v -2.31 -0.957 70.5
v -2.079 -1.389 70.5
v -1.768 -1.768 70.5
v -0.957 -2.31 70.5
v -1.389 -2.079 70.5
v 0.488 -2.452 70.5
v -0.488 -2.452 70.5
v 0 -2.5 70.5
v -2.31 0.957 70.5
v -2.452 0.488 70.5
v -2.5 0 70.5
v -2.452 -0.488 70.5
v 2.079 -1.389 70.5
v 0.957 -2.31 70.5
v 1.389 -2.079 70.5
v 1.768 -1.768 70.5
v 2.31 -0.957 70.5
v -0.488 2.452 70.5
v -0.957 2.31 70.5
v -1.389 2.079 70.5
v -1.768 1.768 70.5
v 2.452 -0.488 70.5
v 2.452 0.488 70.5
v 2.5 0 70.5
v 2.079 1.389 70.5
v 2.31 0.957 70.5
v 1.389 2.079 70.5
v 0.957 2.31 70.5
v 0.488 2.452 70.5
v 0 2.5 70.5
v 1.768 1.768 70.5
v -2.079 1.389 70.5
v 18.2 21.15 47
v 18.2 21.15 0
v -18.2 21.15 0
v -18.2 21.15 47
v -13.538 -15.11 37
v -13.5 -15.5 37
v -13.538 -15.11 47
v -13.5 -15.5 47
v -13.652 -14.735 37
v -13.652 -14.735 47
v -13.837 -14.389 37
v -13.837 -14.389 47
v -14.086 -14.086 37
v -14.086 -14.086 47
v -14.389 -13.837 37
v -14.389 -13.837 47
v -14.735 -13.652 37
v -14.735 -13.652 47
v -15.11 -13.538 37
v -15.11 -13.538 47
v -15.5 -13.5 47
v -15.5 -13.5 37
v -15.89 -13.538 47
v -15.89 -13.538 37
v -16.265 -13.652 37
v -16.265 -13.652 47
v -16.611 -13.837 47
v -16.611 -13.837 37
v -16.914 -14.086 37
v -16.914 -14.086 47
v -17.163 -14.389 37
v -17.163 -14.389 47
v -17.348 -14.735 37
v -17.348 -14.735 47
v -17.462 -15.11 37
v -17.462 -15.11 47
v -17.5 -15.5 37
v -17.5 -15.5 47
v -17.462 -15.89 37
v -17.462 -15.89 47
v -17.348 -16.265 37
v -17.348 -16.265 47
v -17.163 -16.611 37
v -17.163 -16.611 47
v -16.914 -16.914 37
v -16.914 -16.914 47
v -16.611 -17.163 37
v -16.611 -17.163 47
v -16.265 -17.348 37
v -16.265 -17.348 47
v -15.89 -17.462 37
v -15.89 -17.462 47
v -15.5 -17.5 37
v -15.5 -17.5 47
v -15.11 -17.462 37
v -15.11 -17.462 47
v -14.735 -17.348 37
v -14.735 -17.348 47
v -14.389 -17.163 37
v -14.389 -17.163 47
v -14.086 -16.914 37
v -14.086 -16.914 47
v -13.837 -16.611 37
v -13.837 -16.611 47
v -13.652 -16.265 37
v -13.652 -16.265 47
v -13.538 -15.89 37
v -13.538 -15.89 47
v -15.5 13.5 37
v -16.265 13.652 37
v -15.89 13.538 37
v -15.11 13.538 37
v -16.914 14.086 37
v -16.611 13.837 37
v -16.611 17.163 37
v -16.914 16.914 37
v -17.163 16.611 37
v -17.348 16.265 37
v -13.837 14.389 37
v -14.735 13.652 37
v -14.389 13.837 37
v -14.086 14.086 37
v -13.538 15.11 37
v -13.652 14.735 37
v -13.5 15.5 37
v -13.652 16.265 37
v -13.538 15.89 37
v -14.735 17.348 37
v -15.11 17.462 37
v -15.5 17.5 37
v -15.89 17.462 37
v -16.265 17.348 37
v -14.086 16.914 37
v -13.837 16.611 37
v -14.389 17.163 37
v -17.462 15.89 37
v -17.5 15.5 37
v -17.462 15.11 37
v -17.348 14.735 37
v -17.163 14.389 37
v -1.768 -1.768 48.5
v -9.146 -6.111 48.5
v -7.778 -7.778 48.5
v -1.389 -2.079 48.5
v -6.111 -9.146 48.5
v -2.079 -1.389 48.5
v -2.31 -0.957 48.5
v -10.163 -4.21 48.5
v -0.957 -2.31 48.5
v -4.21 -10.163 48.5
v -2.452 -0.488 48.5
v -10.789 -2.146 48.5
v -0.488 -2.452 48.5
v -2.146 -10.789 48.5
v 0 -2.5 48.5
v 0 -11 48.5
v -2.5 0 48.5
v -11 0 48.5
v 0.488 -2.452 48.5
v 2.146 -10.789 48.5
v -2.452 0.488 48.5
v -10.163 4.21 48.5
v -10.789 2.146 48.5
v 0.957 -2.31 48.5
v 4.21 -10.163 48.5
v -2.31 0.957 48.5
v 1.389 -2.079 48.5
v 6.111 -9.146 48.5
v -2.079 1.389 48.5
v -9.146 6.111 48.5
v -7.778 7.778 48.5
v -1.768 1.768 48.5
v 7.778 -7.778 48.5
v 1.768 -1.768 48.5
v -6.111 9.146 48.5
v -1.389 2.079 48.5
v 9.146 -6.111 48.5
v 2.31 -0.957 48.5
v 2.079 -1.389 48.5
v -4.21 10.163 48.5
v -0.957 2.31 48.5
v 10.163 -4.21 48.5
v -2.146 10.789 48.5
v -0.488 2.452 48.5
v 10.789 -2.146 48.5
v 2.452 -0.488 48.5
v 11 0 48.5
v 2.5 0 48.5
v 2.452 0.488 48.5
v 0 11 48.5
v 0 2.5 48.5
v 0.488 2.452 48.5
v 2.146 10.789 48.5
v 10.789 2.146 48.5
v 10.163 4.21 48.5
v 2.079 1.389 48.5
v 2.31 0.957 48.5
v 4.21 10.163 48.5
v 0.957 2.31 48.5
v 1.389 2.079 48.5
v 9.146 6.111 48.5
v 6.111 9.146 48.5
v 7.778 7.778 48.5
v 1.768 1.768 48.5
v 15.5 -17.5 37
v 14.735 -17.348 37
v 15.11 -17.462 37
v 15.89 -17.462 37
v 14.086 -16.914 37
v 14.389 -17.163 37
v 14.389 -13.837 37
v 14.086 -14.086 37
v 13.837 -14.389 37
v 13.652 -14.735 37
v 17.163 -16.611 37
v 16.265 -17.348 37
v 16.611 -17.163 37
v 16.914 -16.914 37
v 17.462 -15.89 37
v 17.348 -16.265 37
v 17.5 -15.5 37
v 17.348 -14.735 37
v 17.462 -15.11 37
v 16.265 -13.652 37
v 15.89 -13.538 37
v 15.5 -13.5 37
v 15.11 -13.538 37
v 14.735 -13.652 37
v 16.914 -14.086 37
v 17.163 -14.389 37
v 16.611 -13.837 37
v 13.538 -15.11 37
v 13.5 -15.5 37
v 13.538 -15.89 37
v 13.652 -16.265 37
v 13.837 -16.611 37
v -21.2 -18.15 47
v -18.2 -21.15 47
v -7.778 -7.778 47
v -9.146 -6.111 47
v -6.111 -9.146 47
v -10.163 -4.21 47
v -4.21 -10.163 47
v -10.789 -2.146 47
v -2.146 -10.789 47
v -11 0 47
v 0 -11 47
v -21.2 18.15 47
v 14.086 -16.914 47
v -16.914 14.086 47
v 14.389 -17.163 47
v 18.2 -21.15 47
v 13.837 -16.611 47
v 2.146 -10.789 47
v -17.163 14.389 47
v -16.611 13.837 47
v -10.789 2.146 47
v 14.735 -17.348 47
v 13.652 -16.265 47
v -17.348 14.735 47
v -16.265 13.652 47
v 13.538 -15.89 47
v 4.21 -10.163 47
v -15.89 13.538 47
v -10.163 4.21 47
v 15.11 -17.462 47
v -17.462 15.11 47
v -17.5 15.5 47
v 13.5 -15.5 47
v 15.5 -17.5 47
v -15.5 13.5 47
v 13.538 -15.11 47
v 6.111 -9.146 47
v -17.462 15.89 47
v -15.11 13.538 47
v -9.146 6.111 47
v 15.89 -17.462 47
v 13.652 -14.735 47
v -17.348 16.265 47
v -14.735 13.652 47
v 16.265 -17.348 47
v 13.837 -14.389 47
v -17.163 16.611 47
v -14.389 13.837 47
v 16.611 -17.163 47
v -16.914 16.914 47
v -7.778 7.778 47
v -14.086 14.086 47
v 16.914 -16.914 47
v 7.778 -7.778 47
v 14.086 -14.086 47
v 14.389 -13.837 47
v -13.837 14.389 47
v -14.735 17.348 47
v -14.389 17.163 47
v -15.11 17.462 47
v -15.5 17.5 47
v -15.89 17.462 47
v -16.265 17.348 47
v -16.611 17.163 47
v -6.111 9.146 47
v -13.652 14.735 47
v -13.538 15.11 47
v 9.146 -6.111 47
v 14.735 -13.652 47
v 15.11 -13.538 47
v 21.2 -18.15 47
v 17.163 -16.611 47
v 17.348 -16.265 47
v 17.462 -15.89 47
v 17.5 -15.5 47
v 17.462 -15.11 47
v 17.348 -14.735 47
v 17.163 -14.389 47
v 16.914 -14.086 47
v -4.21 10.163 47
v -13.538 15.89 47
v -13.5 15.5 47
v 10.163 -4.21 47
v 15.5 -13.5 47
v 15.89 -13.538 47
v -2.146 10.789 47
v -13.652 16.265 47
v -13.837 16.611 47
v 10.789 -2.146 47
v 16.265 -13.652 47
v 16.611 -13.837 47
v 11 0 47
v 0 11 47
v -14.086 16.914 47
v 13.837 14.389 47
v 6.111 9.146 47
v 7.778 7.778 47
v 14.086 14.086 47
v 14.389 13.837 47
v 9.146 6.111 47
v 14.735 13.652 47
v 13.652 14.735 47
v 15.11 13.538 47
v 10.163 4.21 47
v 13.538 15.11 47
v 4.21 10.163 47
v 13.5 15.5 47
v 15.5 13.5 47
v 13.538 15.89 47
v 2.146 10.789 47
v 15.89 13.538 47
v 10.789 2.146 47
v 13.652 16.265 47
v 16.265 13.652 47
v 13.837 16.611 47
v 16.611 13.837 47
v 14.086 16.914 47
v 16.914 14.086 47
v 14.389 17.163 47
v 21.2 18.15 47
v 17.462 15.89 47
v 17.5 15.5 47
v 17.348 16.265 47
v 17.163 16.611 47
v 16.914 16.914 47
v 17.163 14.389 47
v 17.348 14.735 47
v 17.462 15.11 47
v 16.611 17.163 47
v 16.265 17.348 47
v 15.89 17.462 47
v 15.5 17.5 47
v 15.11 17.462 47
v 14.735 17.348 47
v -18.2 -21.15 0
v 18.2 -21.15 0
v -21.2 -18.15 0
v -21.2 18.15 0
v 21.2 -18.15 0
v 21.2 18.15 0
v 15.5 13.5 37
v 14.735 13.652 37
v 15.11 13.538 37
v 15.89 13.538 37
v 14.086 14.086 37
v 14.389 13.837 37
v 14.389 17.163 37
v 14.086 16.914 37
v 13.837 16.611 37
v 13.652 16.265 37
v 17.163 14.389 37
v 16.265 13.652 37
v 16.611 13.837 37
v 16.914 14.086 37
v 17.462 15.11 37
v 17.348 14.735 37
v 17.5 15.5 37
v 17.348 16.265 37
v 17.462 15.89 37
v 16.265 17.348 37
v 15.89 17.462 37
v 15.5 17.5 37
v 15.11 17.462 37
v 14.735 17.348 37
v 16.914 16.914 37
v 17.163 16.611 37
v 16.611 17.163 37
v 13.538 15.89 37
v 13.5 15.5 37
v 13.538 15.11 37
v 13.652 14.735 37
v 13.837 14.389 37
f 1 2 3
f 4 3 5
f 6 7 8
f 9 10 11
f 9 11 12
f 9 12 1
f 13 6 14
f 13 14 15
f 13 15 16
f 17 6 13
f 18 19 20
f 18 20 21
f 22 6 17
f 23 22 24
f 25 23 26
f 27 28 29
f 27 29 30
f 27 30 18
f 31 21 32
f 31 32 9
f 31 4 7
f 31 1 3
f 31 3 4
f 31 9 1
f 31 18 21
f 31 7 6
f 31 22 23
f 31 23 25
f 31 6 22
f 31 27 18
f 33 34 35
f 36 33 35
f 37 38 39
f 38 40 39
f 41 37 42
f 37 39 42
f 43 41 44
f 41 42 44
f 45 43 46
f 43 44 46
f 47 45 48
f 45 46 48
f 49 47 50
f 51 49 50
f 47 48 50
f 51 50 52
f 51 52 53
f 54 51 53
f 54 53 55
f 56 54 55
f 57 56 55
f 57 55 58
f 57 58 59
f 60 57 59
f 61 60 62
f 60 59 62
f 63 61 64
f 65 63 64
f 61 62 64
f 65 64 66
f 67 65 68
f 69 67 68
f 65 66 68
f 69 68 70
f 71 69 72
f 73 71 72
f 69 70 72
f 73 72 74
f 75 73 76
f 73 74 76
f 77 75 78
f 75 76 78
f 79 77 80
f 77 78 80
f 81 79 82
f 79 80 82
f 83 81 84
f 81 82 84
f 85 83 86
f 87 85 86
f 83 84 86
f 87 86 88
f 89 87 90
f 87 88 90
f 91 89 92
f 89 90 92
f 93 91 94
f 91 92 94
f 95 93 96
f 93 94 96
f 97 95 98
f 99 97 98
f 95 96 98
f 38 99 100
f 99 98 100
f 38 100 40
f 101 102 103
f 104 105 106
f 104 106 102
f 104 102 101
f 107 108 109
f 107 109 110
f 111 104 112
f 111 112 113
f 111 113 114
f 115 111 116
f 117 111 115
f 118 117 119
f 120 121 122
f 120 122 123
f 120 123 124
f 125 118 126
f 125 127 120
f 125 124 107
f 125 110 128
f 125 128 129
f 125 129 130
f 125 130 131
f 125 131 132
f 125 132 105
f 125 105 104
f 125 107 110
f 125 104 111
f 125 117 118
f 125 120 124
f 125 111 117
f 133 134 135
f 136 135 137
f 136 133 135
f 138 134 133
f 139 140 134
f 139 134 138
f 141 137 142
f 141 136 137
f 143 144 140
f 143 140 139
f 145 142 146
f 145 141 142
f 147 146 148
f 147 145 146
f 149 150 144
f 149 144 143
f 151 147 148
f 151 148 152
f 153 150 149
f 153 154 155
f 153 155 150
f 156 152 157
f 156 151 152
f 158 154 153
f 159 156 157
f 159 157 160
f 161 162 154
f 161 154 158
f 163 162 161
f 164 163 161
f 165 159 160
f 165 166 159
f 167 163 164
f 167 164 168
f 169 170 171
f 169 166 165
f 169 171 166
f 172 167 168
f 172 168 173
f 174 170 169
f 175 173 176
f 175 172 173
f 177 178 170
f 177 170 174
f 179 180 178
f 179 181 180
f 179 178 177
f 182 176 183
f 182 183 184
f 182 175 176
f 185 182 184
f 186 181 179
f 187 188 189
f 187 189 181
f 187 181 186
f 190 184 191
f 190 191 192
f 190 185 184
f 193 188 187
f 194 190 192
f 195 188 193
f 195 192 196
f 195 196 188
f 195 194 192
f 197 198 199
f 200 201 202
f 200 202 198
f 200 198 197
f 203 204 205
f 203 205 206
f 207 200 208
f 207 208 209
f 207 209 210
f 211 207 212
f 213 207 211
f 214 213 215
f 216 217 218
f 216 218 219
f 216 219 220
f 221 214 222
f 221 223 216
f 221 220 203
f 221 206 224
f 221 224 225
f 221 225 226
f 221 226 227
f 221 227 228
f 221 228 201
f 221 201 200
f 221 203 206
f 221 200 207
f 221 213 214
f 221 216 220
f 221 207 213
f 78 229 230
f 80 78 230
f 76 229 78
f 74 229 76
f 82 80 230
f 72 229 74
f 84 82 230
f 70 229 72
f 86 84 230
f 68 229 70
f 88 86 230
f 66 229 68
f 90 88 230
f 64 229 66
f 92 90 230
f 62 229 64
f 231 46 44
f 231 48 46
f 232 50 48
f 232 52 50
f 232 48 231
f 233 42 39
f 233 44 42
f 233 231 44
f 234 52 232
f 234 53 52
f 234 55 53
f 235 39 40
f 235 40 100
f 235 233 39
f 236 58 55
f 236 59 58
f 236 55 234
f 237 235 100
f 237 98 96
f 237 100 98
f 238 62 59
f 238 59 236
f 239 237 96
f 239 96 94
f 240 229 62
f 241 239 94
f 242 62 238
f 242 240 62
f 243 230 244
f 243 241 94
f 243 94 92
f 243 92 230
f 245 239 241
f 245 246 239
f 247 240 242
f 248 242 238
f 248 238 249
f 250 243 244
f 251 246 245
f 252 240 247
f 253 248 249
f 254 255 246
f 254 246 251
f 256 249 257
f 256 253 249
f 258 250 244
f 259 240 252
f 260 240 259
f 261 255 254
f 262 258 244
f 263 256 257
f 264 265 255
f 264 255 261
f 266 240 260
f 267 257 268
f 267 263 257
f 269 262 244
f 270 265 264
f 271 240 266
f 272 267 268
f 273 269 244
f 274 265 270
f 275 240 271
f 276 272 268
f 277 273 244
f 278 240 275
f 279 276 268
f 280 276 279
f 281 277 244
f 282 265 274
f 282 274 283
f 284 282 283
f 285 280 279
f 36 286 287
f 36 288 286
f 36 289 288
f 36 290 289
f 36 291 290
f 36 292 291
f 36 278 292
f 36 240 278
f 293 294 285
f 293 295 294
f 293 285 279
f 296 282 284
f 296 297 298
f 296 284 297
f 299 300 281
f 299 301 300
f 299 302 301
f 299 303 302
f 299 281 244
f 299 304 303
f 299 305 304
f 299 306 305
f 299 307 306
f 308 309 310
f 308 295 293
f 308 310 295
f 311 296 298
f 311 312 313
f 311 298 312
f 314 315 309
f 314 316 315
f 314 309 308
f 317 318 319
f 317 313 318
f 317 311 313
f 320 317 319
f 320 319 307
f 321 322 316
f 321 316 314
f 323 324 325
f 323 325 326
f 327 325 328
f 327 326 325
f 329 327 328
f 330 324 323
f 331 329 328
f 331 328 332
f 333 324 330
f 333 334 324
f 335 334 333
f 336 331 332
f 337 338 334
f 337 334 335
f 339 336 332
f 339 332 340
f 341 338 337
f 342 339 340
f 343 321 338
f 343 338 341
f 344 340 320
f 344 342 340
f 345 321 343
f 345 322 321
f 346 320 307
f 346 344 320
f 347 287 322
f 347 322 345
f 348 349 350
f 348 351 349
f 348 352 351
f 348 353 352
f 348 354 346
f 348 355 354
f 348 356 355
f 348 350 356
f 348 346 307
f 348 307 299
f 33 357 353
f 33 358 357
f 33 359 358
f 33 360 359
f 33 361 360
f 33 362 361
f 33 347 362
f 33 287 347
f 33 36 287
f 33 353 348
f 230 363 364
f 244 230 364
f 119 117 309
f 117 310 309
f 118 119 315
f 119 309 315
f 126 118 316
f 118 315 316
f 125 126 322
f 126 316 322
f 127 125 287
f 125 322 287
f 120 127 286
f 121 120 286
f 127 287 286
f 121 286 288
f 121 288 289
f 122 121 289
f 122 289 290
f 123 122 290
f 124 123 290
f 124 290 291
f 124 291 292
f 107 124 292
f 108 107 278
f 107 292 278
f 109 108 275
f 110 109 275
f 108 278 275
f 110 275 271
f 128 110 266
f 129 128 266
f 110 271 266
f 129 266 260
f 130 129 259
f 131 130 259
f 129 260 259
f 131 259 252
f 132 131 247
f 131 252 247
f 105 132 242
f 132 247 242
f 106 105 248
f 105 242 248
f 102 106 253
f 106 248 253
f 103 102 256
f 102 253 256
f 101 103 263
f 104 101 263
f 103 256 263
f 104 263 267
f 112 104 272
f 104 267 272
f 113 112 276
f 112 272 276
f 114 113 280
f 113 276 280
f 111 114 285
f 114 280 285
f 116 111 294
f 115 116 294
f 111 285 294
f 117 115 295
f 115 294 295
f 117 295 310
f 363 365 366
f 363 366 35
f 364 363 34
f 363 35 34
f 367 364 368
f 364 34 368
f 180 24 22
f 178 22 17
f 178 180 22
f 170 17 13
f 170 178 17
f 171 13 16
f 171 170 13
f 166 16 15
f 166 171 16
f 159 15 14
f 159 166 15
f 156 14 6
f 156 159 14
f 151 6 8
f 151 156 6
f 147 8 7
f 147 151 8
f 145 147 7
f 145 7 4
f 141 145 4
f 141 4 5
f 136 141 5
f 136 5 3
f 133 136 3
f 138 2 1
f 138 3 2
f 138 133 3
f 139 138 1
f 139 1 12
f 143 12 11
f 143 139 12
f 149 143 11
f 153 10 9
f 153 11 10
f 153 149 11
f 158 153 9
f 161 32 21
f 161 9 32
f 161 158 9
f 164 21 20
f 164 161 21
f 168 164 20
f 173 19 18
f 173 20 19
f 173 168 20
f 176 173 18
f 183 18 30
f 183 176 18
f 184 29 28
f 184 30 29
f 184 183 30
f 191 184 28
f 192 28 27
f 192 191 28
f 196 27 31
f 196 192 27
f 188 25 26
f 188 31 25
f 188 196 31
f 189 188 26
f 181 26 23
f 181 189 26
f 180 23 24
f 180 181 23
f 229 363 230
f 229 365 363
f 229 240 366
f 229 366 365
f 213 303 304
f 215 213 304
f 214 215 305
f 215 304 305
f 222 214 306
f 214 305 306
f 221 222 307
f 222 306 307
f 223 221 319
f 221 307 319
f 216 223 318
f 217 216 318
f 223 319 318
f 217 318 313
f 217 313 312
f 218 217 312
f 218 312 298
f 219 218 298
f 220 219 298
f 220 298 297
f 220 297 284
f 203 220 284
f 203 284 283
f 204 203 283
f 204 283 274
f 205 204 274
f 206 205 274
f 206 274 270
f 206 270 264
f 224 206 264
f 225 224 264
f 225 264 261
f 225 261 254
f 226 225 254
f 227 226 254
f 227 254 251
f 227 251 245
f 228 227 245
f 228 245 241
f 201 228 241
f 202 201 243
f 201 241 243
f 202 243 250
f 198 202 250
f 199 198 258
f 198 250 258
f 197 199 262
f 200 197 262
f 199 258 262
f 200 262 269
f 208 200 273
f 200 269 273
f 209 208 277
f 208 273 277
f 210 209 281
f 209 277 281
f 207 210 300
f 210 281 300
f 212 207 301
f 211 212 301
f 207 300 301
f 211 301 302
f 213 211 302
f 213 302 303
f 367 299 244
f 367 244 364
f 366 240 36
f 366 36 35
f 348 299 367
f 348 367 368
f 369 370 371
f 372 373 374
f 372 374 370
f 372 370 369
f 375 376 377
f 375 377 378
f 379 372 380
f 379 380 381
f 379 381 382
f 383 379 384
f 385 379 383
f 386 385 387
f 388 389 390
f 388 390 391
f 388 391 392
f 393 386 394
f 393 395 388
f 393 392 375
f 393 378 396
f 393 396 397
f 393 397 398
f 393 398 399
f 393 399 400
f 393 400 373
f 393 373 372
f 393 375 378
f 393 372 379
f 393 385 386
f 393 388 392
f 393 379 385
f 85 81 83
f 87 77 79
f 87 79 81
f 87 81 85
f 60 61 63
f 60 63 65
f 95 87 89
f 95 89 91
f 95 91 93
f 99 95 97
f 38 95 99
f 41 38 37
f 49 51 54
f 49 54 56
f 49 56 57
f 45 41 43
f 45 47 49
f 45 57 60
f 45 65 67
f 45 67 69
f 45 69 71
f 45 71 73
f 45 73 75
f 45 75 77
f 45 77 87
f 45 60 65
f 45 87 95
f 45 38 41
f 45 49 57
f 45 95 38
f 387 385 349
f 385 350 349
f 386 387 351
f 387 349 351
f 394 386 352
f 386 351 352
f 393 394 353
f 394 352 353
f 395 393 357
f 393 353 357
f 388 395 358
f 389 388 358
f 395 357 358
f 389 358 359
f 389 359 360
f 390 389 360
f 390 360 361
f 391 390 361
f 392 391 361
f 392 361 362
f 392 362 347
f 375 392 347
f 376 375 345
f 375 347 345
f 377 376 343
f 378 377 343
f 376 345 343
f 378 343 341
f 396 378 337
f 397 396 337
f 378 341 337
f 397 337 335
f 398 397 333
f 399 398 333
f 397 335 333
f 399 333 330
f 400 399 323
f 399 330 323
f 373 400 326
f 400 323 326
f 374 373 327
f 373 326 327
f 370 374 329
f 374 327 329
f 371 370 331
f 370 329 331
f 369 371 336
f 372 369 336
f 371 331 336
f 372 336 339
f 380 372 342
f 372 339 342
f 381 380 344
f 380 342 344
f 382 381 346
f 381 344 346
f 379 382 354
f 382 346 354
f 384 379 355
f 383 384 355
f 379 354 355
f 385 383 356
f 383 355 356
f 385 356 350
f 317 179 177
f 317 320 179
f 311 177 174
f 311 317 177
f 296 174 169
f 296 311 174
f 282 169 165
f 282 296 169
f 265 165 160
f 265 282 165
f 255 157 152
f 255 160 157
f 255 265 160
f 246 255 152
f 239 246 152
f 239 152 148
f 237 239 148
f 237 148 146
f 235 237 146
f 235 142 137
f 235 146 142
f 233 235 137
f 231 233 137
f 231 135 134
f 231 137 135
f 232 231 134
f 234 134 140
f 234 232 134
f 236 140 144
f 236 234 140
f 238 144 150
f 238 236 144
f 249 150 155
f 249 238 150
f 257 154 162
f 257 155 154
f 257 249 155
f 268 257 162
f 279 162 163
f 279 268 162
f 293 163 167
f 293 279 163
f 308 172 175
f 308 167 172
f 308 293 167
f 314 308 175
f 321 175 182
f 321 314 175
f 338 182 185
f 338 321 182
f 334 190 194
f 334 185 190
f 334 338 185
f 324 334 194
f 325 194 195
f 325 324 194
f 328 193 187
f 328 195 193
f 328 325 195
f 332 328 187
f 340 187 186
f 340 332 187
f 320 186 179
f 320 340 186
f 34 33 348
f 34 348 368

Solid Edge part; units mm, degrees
sketch "Sketch1" plane through (0, 0, 0) normal (0, 0, 1) x (1, 0, 0)
  line L0 (-21.2, -21.15) -> (21.2, -21.15)
  line L1 (21.2, -21.15) -> (21.2, 21.15)
  line L2 (21.2, 21.15) -> (-21.2, 21.15)
  line L3 (-21.2, 21.15) -> (-21.2, -21.15)
extrude "Protrusion1" add sketch "Sketch1" along normal blind 47
chamfer "Chamfer_1" distance 3 angle 45 4 edges at (21.2, -21.15, 23.5) (-21.2, -21.15, 23.5) (-21.2, 21.15, 23.5) (21.2, 21.15, 23.5)
sketch "Sketch2" plane through (0, 0, 47) normal (0, 0, 1) x (1, 0, 0)
  circle A0 centre (0, 0) radius 2.5
extrude "ExtrudedProtrusion_2" add sketch "Sketch2" along normal blind 23.5
sketch "Sketch3" plane through (0, 0, 47) normal (0, 0, 1) x (1, 0, 0)
  circle A0 centre (-15.5, 15.5) radius 2
  circle A1 centre (-15.5, -15.5) radius 2
  circle A2 centre (15.5, -15.5) radius 2
  circle A3 centre (15.5, 15.5) radius 2
extrude "ExtrudedCutout_1" cut sketch "Sketch3" against normal blind 10
sketch "Sketch4" plane through (0, 0, 47) normal (0, 0, 1) x (1, 0, 0)
  circle A0 centre (0, 0) radius 11
extrude "ExtrudedProtrusion_3" add sketch "Sketch4" along normal blind 1.5
